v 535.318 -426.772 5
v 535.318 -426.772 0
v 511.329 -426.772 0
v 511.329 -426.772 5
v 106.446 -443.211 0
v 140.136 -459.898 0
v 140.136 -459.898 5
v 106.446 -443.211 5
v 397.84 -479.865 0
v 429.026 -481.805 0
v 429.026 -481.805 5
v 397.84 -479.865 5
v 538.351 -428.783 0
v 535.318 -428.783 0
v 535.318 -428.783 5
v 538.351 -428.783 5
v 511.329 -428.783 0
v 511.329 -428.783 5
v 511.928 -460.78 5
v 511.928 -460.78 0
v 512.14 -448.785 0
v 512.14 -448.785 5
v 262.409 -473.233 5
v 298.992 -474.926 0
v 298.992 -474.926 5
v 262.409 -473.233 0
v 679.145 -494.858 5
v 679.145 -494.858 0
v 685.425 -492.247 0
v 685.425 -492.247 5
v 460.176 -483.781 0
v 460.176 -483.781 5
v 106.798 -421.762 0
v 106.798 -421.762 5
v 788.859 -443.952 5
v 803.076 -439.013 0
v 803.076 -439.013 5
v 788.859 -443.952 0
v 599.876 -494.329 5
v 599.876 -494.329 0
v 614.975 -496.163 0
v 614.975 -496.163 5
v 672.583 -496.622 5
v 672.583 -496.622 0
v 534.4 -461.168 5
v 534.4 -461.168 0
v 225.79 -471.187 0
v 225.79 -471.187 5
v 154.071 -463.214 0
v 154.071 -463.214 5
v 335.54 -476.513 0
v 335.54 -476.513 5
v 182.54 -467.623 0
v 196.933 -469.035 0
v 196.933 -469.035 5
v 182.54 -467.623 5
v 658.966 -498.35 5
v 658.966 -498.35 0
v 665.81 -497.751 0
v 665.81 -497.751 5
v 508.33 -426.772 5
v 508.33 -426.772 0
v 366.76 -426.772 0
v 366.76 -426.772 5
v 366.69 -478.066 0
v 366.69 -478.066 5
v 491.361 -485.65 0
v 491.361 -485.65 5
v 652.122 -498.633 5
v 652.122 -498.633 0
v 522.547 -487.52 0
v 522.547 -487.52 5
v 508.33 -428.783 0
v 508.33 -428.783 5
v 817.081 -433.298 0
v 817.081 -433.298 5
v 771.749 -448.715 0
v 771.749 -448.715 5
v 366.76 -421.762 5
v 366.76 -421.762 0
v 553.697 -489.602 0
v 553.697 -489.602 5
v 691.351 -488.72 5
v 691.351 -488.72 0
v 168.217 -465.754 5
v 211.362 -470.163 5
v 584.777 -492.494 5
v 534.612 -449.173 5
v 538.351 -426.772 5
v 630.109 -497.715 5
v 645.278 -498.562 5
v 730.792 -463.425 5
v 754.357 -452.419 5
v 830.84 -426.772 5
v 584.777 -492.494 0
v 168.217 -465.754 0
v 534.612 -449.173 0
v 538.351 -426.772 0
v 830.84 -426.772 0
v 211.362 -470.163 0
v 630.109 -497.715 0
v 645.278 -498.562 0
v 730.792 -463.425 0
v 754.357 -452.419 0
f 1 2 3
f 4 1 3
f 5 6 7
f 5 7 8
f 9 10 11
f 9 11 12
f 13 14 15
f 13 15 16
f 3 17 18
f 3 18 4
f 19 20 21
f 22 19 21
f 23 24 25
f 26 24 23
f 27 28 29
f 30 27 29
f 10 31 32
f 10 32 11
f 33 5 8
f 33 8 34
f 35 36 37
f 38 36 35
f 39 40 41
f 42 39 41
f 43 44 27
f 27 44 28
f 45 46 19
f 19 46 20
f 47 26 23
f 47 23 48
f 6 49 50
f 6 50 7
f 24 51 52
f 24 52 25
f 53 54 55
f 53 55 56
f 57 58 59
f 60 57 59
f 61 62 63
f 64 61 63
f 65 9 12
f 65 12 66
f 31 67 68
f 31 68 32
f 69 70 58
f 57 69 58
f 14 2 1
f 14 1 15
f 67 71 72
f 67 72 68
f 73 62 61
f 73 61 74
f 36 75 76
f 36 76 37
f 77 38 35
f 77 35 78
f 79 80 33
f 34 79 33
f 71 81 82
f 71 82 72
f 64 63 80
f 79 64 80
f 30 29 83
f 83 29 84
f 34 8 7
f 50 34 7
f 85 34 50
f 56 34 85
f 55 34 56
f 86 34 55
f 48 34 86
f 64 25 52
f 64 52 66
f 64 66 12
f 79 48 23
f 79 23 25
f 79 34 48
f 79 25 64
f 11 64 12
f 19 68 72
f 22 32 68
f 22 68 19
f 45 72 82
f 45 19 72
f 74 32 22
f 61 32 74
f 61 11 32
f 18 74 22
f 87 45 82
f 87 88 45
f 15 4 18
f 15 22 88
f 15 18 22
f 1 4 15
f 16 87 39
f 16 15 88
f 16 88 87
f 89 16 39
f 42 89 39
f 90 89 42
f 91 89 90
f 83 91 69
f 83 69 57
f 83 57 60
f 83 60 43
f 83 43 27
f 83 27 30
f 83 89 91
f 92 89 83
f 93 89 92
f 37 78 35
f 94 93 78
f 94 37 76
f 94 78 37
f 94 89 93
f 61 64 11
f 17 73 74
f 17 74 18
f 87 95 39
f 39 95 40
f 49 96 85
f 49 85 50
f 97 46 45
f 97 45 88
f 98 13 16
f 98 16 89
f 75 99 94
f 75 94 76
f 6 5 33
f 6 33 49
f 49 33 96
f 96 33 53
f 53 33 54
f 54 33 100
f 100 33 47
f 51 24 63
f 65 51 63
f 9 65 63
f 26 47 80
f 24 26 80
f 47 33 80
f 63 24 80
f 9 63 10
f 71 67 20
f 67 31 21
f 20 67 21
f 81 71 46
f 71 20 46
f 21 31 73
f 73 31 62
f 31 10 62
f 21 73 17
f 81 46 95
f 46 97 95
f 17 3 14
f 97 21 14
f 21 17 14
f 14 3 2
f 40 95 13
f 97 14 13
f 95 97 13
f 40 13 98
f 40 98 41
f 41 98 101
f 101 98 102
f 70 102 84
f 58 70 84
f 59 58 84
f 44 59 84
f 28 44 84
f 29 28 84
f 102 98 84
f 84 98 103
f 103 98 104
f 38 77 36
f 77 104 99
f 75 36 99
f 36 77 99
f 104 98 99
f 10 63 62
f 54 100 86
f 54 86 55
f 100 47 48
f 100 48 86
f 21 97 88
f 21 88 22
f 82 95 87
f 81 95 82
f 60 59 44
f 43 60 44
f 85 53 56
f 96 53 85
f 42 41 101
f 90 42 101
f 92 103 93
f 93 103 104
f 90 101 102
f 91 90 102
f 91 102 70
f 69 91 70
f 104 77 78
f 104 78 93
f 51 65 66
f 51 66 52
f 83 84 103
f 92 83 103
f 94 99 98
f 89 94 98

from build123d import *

# Parameters (mm, degrees)
PAD011_DEPTH = 5


with BuildPart() as part:
    # Sketch006 → Pad011 (new body)
    with BuildSketch(Plane.XY):
        with BuildLine():
            add(Edge.make_bspline(
                [(584.77704, -492.49432), (599.875929, -494.328765)],
                knots=[0, 0, 43.114731, 43.114731], degree=1))
            add(Edge.make_bspline(
                [(599.875929, -494.328765), (614.974818, -496.163209)],
                knots=[0, 0, 43.114731, 43.114731], degree=1))
            add(Edge.make_bspline(
                [(614.974818, -496.163209), (630.108984, -497.715431)],
                knots=[0, 0, 43.125051, 43.125051], degree=1))
            add(Edge.make_bspline(
                [(630.108984, -497.715431), (645.278428, -498.562098)],
                knots=[0, 0, 43.066925, 43.066925], degree=1))
            add(Edge.make_bspline(
                [(645.278428, -498.562098), (652.122317, -498.632653)],
                knots=[0, 0, 19.401031, 19.401031], degree=1))
            add(Edge.make_bspline(
                [(652.122317, -498.632653), (658.966206, -498.350431)],
                knots=[0, 0, 19.416488, 19.416488], degree=1))
            add(Edge.make_bspline(
                [(658.966206, -498.350431), (665.810094, -497.750709)],
                knots=[0, 0, 19.474342, 19.474342], degree=1))
            add(Edge.make_bspline(
                [(665.810094, -497.750709), (672.583427, -496.62182)],
                knots=[0, 0, 19.46484, 19.46484], degree=1))
            add(Edge.make_bspline(
                [(672.583427, -496.62182), (679.145094, -494.857931)],
                knots=[0, 0, 19.260322, 19.260322], degree=1))
            add(Edge.make_bspline(
                [(679.145094, -494.857931), (685.424538, -492.247376)],
                knots=[0, 0, 19.276929, 19.276929], degree=1))
            add(Edge.make_bspline(
                [(685.424538, -492.247376), (691.351205, -488.719598)],
                knots=[0, 0, 19.550959, 19.550959], degree=1))
            add(Edge.make_bspline(
                [(691.351205, -488.719598), (730.791759, -463.425432)],
                knots=[0, 0, 132.816151, 132.816151], degree=1))
            add(Edge.make_bspline(
                [(730.791759, -463.425432), (742.574537, -457.922099)],
                knots=[0, 0, 36.863532, 36.863532], degree=1))
            add(Edge.make_bspline(
                [(754.357315, -452.418766), (742.574537, -457.922099)],
                knots=[0, 0, 36.863532, 36.863532], degree=1))
            add(Edge.make_bspline(
                [(771.749259, -448.714599), (754.357315, -452.418766)],
                knots=[0, 0, 50.405754, 50.405754], degree=1))
            add(Edge.make_bspline(
                [(788.85898, -443.952099), (771.749259, -448.714599)],
                knots=[0, 0, 50.343818, 50.343818], degree=1))
            add(Edge.make_bspline(
                [(803.075925, -439.01321), (788.85898, -443.952099)],
                knots=[0, 0, 42.662513, 42.662513], degree=1))
            add(Edge.make_bspline(
                [(817.081202, -433.29821), (803.075925, -439.01321)],
                knots=[0, 0, 42.878083, 42.878083], degree=1))
            add(Edge.make_bspline(
                [(830.839535, -426.771822), (817.081202, -433.29821)],
                knots=[0, 0, 43.16538, 43.16538], degree=1))
            add(Edge.make_bspline(
                [(830.839535, -426.771822), (538.351486, -426.771822)],
                knots=[0, 0, 829.1, 829.1], degree=1))
            add(Edge.make_bspline(
                [(538.351486, -428.782655), (538.351486, -426.771822)],
                knots=[0, 0, 5.7, 5.7], degree=1))
            add(Edge.make_bspline(
                [(535.317597, -428.782655), (538.351486, -428.782655)],
                knots=[0, 0, 8.6, 8.6], degree=1))
            add(Edge.make_bspline(
                [(535.317597, -426.771822), (535.317597, -428.782655)],
                knots=[0, 0, 5.7, 5.7], degree=1))
            add(Edge.make_bspline(
                [(535.317597, -426.771822), (511.328709, -426.771822)],
                knots=[0, 0, 68, 68], degree=1))
            add(Edge.make_bspline(
                [(511.328709, -428.782655), (511.328709, -426.771822)],
                knots=[0, 0, 5.7, 5.7], degree=1))
            add(Edge.make_bspline(
                [(508.330098, -428.782655), (511.328709, -428.782655)],
                knots=[0, 0, 8.5, 8.5], degree=1))
            add(Edge.make_bspline(
                [(508.330098, -426.771822), (508.330098, -428.782655)],
                knots=[0, 0, 5.7, 5.7], degree=1))
            add(Edge.make_bspline(
                [(508.330098, -426.771822), (366.760379, -426.771822)],
                knots=[0, 0, 401.3, 401.3], degree=1))
            add(Edge.make_bspline(
                [(366.760379, -426.771822), (366.760379, -421.762377)],
                knots=[0, 0, 14.2, 14.2], degree=1))
            add(Edge.make_bspline(
                [(366.760379, -421.762377), (106.79844, -421.762377)],
                knots=[0, 0, 736.9, 736.9], degree=1))
            add(Edge.make_bspline(
                [(106.445662, -443.211266), (106.79844, -421.762377)],
                knots=[0, 0, 60.808223, 60.808223], degree=1))
            add(Edge.make_bspline(
                [(140.135939, -459.897654), (106.445662, -443.211266)],
                knots=[0, 0, 106.57176, 106.57176], degree=1))
            add(Edge.make_bspline(
                [(154.070661, -463.213765), (140.135939, -459.897654)],
                knots=[0, 0, 40.603079, 40.603079], degree=1))
            add(Edge.make_bspline(
                [(168.21705, -465.753765), (154.070661, -463.213765)],
                knots=[0, 0, 40.741257, 40.741257], degree=1))
            add(Edge.make_bspline(
                [(182.539827, -467.623488), (168.21705, -465.753765)],
                knots=[0, 0, 40.944475, 40.944475], degree=1))
            add(Edge.make_bspline(
                [(196.93316, -469.034599), (182.539827, -467.623488)],
                knots=[0, 0, 40.99561, 40.99561], degree=1))
            add(Edge.make_bspline(
                [(211.361771, -470.163487), (196.93316, -469.034599)],
                knots=[0, 0, 41.024992, 41.024992], degree=1))
            add(Edge.make_bspline(
                [(225.790382, -471.186543), (211.361771, -470.163487)],
                knots=[0, 0, 41.002683, 41.002683], degree=1))
            add(Edge.make_bspline(
                [(262.408714, -473.232654), (225.790382, -471.186543)],
                knots=[0, 0, 103.961916, 103.961916], degree=1))
            add(Edge.make_bspline(
                [(298.991769, -474.925987), (262.408714, -473.232654)],
                knots=[0, 0, 103.81103, 103.81103], degree=1))
            add(Edge.make_bspline(
                [(335.539546, -476.513487), (298.991769, -474.925987)],
                knots=[0, 0, 103.697686, 103.697686], degree=1))
            add(Edge.make_bspline(
                [(366.689823, -478.06571), (335.539546, -476.513487)],
                knots=[0, 0, 88.409558, 88.409558], degree=1))
            add(Edge.make_bspline(
                [(397.8401, -479.864876), (366.689823, -478.06571)],
                knots=[0, 0, 88.447159, 88.447159], degree=1))
            add(Edge.make_bspline(
                [(429.025655, -481.805154), (397.8401, -479.864876)],
                knots=[0, 0, 88.570932, 88.570932], degree=1))
            add(Edge.make_bspline(
                [(460.175932, -483.780709), (429.025655, -481.805154)],
                knots=[0, 0, 88.477398, 88.477398], degree=1))
            add(Edge.make_bspline(
                [(491.361487, -485.650432), (460.175932, -483.780709)],
                knots=[0, 0, 88.558738, 88.558738], degree=1))
            add(Edge.make_bspline(
                [(522.547042, -487.520154), (491.361487, -485.650432)],
                knots=[0, 0, 88.558738, 88.558738], degree=1))
            add(Edge.make_bspline(
                [(553.697319, -489.601543), (522.547042, -487.520154)],
                knots=[0, 0, 88.496893, 88.496893], degree=1))
            add(Edge.make_bspline(
                [(584.77704, -492.49432), (553.697319, -489.601543)],
                knots=[0, 0, 88.480789, 88.480789], degree=1))
        make_face()
        with BuildLine():
            add(Edge.make_bspline(
                [(511.928431, -460.779599), (512.140098, -448.785155)],
                knots=[0, 0, 34.005294, 34.005294], degree=1))
            add(Edge.make_bspline(
                [(534.612042, -449.17321), (512.140098, -448.785155)],
                knots=[0, 0, 63.709497, 63.709497], degree=1))
            add(Edge.make_bspline(
                [(534.400375, -461.167654), (534.612042, -449.17321)],
                knots=[0, 0, 34.005294, 34.005294], degree=1))
            add(Edge.make_bspline(
                [(534.400375, -461.167654), (511.928431, -460.779599)],
                knots=[0, 0, 63.709497, 63.709497], degree=1))
        make_face(mode=Mode.SUBTRACT)
    extrude(amount=PAD011_DEPTH)


solid = part.part
